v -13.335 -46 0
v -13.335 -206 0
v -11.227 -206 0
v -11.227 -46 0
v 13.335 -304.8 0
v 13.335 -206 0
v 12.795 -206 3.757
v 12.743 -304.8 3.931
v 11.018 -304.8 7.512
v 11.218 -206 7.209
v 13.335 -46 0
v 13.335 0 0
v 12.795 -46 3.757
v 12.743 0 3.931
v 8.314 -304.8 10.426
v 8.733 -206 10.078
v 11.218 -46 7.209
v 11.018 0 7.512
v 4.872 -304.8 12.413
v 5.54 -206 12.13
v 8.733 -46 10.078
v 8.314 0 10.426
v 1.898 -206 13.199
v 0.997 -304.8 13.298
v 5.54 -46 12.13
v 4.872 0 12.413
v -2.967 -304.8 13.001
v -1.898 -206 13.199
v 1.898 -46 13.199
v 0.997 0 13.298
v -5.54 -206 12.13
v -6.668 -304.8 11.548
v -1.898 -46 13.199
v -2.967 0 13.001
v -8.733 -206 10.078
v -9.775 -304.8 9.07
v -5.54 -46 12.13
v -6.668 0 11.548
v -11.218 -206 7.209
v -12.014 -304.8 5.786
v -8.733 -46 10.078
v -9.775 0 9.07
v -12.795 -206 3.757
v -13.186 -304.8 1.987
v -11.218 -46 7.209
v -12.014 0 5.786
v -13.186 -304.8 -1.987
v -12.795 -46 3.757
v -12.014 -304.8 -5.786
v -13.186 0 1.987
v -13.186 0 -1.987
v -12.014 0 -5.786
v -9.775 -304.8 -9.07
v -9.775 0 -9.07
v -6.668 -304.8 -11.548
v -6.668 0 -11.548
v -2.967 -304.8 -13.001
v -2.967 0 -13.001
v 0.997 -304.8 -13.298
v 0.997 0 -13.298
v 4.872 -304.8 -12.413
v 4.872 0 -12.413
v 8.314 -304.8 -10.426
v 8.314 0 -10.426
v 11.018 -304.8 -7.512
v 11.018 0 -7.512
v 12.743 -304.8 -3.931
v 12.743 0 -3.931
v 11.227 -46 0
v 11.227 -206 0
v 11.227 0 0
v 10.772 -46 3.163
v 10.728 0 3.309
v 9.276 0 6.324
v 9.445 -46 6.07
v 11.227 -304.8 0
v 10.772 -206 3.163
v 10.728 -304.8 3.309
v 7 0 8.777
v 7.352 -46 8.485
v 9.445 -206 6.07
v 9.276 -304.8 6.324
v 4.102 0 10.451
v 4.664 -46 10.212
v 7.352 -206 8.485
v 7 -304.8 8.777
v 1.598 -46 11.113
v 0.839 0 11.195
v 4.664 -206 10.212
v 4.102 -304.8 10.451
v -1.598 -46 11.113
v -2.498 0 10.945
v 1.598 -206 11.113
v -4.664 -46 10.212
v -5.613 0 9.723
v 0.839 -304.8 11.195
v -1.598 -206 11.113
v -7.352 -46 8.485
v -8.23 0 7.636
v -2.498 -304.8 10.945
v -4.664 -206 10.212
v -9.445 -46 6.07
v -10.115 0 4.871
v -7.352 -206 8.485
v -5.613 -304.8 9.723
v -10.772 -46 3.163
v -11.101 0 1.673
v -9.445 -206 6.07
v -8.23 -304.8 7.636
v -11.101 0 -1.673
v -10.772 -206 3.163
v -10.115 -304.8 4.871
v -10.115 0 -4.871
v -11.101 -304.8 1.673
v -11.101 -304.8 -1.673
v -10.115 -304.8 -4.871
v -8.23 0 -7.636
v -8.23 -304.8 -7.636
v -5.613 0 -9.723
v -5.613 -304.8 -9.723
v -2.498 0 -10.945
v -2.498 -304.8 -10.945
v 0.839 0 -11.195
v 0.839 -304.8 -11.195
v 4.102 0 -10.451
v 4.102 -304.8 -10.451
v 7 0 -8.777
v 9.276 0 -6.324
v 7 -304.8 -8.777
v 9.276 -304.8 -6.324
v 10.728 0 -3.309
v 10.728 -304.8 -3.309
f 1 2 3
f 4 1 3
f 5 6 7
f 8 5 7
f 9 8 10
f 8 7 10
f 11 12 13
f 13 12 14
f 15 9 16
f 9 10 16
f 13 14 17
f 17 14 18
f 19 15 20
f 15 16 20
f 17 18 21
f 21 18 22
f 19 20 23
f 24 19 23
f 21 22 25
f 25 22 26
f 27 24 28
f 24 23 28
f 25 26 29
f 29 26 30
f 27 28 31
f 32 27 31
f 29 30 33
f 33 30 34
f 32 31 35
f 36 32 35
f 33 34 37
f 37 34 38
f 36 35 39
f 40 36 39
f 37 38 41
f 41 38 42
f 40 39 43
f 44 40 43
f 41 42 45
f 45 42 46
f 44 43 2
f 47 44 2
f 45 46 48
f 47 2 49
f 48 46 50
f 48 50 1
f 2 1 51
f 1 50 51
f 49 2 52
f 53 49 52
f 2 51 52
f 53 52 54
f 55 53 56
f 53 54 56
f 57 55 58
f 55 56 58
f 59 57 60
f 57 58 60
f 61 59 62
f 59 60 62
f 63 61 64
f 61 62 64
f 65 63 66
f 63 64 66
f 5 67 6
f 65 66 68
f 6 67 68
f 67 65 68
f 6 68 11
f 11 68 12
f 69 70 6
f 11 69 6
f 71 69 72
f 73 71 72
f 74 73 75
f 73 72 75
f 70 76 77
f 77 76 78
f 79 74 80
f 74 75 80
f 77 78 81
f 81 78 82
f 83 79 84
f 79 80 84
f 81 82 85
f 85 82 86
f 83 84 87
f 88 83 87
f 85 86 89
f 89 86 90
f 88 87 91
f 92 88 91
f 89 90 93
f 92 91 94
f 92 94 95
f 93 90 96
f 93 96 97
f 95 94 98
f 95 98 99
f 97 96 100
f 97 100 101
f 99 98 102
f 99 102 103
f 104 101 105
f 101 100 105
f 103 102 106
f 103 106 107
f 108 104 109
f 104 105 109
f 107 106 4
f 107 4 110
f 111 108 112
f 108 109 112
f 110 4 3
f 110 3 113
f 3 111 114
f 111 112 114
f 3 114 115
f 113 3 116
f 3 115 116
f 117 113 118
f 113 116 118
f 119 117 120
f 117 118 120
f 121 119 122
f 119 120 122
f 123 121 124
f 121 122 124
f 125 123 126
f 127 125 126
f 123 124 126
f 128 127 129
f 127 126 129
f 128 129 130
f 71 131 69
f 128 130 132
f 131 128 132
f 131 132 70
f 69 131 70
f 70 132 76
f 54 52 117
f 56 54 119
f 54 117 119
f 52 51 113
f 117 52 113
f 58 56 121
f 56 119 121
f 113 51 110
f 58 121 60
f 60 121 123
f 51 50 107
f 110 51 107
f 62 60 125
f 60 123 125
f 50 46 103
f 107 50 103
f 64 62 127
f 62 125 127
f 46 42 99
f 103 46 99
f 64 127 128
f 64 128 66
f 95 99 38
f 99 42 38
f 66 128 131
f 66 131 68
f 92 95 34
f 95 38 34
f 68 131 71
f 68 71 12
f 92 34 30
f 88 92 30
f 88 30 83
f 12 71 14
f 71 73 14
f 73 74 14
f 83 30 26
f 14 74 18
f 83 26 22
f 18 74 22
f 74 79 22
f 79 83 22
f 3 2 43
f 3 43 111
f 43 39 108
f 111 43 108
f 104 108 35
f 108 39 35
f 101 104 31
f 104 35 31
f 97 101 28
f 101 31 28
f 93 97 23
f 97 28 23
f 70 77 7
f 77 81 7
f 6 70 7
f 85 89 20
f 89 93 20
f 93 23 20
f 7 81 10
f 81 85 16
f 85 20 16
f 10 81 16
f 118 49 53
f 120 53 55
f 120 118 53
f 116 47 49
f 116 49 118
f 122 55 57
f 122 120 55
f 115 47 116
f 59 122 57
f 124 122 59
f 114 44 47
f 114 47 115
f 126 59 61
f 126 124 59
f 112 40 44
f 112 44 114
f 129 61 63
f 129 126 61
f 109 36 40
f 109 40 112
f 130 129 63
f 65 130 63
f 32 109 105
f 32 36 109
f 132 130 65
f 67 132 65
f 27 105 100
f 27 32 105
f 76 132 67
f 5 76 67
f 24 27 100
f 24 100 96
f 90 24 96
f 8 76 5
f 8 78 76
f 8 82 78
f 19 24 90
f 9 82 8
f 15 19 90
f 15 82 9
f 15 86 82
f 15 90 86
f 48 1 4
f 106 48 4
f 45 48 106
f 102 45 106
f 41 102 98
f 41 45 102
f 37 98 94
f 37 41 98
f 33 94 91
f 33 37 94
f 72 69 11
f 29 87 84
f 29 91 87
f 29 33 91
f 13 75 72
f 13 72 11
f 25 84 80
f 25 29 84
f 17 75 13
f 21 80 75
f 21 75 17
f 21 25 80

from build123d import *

# Parameters (mm, degrees)
F0_R     = 13.335
F1_DEPTH = 304.8
F2_R     = 11.2268
F3_DEPTH = 304.801
F5_W     = 26.67
F5_H     = 160
F6_DEPTH = 13.335


with BuildPart() as f1:
    # F0 (on Front) → F1 (new body)
    with BuildSketch(Plane.XZ):
        Circle(F0_R)
    extrude(amount=F1_DEPTH)

    # F2 (on face) → F3 (cut, through all)
    with BuildSketch(Plane.XZ.offset(304.8)):
        Circle(F2_R)
    extrude(amount=-F3_DEPTH, mode=Mode.SUBTRACT)

    # F5 (on offset) → F6 (cut)
    with BuildSketch(Plane.XY.offset(13.335)):
        with Locations((0, -126)):
            Rectangle(F5_W, F5_H)
    extrude(amount=-F6_DEPTH, mode=Mode.SUBTRACT)


solid = f1.part
